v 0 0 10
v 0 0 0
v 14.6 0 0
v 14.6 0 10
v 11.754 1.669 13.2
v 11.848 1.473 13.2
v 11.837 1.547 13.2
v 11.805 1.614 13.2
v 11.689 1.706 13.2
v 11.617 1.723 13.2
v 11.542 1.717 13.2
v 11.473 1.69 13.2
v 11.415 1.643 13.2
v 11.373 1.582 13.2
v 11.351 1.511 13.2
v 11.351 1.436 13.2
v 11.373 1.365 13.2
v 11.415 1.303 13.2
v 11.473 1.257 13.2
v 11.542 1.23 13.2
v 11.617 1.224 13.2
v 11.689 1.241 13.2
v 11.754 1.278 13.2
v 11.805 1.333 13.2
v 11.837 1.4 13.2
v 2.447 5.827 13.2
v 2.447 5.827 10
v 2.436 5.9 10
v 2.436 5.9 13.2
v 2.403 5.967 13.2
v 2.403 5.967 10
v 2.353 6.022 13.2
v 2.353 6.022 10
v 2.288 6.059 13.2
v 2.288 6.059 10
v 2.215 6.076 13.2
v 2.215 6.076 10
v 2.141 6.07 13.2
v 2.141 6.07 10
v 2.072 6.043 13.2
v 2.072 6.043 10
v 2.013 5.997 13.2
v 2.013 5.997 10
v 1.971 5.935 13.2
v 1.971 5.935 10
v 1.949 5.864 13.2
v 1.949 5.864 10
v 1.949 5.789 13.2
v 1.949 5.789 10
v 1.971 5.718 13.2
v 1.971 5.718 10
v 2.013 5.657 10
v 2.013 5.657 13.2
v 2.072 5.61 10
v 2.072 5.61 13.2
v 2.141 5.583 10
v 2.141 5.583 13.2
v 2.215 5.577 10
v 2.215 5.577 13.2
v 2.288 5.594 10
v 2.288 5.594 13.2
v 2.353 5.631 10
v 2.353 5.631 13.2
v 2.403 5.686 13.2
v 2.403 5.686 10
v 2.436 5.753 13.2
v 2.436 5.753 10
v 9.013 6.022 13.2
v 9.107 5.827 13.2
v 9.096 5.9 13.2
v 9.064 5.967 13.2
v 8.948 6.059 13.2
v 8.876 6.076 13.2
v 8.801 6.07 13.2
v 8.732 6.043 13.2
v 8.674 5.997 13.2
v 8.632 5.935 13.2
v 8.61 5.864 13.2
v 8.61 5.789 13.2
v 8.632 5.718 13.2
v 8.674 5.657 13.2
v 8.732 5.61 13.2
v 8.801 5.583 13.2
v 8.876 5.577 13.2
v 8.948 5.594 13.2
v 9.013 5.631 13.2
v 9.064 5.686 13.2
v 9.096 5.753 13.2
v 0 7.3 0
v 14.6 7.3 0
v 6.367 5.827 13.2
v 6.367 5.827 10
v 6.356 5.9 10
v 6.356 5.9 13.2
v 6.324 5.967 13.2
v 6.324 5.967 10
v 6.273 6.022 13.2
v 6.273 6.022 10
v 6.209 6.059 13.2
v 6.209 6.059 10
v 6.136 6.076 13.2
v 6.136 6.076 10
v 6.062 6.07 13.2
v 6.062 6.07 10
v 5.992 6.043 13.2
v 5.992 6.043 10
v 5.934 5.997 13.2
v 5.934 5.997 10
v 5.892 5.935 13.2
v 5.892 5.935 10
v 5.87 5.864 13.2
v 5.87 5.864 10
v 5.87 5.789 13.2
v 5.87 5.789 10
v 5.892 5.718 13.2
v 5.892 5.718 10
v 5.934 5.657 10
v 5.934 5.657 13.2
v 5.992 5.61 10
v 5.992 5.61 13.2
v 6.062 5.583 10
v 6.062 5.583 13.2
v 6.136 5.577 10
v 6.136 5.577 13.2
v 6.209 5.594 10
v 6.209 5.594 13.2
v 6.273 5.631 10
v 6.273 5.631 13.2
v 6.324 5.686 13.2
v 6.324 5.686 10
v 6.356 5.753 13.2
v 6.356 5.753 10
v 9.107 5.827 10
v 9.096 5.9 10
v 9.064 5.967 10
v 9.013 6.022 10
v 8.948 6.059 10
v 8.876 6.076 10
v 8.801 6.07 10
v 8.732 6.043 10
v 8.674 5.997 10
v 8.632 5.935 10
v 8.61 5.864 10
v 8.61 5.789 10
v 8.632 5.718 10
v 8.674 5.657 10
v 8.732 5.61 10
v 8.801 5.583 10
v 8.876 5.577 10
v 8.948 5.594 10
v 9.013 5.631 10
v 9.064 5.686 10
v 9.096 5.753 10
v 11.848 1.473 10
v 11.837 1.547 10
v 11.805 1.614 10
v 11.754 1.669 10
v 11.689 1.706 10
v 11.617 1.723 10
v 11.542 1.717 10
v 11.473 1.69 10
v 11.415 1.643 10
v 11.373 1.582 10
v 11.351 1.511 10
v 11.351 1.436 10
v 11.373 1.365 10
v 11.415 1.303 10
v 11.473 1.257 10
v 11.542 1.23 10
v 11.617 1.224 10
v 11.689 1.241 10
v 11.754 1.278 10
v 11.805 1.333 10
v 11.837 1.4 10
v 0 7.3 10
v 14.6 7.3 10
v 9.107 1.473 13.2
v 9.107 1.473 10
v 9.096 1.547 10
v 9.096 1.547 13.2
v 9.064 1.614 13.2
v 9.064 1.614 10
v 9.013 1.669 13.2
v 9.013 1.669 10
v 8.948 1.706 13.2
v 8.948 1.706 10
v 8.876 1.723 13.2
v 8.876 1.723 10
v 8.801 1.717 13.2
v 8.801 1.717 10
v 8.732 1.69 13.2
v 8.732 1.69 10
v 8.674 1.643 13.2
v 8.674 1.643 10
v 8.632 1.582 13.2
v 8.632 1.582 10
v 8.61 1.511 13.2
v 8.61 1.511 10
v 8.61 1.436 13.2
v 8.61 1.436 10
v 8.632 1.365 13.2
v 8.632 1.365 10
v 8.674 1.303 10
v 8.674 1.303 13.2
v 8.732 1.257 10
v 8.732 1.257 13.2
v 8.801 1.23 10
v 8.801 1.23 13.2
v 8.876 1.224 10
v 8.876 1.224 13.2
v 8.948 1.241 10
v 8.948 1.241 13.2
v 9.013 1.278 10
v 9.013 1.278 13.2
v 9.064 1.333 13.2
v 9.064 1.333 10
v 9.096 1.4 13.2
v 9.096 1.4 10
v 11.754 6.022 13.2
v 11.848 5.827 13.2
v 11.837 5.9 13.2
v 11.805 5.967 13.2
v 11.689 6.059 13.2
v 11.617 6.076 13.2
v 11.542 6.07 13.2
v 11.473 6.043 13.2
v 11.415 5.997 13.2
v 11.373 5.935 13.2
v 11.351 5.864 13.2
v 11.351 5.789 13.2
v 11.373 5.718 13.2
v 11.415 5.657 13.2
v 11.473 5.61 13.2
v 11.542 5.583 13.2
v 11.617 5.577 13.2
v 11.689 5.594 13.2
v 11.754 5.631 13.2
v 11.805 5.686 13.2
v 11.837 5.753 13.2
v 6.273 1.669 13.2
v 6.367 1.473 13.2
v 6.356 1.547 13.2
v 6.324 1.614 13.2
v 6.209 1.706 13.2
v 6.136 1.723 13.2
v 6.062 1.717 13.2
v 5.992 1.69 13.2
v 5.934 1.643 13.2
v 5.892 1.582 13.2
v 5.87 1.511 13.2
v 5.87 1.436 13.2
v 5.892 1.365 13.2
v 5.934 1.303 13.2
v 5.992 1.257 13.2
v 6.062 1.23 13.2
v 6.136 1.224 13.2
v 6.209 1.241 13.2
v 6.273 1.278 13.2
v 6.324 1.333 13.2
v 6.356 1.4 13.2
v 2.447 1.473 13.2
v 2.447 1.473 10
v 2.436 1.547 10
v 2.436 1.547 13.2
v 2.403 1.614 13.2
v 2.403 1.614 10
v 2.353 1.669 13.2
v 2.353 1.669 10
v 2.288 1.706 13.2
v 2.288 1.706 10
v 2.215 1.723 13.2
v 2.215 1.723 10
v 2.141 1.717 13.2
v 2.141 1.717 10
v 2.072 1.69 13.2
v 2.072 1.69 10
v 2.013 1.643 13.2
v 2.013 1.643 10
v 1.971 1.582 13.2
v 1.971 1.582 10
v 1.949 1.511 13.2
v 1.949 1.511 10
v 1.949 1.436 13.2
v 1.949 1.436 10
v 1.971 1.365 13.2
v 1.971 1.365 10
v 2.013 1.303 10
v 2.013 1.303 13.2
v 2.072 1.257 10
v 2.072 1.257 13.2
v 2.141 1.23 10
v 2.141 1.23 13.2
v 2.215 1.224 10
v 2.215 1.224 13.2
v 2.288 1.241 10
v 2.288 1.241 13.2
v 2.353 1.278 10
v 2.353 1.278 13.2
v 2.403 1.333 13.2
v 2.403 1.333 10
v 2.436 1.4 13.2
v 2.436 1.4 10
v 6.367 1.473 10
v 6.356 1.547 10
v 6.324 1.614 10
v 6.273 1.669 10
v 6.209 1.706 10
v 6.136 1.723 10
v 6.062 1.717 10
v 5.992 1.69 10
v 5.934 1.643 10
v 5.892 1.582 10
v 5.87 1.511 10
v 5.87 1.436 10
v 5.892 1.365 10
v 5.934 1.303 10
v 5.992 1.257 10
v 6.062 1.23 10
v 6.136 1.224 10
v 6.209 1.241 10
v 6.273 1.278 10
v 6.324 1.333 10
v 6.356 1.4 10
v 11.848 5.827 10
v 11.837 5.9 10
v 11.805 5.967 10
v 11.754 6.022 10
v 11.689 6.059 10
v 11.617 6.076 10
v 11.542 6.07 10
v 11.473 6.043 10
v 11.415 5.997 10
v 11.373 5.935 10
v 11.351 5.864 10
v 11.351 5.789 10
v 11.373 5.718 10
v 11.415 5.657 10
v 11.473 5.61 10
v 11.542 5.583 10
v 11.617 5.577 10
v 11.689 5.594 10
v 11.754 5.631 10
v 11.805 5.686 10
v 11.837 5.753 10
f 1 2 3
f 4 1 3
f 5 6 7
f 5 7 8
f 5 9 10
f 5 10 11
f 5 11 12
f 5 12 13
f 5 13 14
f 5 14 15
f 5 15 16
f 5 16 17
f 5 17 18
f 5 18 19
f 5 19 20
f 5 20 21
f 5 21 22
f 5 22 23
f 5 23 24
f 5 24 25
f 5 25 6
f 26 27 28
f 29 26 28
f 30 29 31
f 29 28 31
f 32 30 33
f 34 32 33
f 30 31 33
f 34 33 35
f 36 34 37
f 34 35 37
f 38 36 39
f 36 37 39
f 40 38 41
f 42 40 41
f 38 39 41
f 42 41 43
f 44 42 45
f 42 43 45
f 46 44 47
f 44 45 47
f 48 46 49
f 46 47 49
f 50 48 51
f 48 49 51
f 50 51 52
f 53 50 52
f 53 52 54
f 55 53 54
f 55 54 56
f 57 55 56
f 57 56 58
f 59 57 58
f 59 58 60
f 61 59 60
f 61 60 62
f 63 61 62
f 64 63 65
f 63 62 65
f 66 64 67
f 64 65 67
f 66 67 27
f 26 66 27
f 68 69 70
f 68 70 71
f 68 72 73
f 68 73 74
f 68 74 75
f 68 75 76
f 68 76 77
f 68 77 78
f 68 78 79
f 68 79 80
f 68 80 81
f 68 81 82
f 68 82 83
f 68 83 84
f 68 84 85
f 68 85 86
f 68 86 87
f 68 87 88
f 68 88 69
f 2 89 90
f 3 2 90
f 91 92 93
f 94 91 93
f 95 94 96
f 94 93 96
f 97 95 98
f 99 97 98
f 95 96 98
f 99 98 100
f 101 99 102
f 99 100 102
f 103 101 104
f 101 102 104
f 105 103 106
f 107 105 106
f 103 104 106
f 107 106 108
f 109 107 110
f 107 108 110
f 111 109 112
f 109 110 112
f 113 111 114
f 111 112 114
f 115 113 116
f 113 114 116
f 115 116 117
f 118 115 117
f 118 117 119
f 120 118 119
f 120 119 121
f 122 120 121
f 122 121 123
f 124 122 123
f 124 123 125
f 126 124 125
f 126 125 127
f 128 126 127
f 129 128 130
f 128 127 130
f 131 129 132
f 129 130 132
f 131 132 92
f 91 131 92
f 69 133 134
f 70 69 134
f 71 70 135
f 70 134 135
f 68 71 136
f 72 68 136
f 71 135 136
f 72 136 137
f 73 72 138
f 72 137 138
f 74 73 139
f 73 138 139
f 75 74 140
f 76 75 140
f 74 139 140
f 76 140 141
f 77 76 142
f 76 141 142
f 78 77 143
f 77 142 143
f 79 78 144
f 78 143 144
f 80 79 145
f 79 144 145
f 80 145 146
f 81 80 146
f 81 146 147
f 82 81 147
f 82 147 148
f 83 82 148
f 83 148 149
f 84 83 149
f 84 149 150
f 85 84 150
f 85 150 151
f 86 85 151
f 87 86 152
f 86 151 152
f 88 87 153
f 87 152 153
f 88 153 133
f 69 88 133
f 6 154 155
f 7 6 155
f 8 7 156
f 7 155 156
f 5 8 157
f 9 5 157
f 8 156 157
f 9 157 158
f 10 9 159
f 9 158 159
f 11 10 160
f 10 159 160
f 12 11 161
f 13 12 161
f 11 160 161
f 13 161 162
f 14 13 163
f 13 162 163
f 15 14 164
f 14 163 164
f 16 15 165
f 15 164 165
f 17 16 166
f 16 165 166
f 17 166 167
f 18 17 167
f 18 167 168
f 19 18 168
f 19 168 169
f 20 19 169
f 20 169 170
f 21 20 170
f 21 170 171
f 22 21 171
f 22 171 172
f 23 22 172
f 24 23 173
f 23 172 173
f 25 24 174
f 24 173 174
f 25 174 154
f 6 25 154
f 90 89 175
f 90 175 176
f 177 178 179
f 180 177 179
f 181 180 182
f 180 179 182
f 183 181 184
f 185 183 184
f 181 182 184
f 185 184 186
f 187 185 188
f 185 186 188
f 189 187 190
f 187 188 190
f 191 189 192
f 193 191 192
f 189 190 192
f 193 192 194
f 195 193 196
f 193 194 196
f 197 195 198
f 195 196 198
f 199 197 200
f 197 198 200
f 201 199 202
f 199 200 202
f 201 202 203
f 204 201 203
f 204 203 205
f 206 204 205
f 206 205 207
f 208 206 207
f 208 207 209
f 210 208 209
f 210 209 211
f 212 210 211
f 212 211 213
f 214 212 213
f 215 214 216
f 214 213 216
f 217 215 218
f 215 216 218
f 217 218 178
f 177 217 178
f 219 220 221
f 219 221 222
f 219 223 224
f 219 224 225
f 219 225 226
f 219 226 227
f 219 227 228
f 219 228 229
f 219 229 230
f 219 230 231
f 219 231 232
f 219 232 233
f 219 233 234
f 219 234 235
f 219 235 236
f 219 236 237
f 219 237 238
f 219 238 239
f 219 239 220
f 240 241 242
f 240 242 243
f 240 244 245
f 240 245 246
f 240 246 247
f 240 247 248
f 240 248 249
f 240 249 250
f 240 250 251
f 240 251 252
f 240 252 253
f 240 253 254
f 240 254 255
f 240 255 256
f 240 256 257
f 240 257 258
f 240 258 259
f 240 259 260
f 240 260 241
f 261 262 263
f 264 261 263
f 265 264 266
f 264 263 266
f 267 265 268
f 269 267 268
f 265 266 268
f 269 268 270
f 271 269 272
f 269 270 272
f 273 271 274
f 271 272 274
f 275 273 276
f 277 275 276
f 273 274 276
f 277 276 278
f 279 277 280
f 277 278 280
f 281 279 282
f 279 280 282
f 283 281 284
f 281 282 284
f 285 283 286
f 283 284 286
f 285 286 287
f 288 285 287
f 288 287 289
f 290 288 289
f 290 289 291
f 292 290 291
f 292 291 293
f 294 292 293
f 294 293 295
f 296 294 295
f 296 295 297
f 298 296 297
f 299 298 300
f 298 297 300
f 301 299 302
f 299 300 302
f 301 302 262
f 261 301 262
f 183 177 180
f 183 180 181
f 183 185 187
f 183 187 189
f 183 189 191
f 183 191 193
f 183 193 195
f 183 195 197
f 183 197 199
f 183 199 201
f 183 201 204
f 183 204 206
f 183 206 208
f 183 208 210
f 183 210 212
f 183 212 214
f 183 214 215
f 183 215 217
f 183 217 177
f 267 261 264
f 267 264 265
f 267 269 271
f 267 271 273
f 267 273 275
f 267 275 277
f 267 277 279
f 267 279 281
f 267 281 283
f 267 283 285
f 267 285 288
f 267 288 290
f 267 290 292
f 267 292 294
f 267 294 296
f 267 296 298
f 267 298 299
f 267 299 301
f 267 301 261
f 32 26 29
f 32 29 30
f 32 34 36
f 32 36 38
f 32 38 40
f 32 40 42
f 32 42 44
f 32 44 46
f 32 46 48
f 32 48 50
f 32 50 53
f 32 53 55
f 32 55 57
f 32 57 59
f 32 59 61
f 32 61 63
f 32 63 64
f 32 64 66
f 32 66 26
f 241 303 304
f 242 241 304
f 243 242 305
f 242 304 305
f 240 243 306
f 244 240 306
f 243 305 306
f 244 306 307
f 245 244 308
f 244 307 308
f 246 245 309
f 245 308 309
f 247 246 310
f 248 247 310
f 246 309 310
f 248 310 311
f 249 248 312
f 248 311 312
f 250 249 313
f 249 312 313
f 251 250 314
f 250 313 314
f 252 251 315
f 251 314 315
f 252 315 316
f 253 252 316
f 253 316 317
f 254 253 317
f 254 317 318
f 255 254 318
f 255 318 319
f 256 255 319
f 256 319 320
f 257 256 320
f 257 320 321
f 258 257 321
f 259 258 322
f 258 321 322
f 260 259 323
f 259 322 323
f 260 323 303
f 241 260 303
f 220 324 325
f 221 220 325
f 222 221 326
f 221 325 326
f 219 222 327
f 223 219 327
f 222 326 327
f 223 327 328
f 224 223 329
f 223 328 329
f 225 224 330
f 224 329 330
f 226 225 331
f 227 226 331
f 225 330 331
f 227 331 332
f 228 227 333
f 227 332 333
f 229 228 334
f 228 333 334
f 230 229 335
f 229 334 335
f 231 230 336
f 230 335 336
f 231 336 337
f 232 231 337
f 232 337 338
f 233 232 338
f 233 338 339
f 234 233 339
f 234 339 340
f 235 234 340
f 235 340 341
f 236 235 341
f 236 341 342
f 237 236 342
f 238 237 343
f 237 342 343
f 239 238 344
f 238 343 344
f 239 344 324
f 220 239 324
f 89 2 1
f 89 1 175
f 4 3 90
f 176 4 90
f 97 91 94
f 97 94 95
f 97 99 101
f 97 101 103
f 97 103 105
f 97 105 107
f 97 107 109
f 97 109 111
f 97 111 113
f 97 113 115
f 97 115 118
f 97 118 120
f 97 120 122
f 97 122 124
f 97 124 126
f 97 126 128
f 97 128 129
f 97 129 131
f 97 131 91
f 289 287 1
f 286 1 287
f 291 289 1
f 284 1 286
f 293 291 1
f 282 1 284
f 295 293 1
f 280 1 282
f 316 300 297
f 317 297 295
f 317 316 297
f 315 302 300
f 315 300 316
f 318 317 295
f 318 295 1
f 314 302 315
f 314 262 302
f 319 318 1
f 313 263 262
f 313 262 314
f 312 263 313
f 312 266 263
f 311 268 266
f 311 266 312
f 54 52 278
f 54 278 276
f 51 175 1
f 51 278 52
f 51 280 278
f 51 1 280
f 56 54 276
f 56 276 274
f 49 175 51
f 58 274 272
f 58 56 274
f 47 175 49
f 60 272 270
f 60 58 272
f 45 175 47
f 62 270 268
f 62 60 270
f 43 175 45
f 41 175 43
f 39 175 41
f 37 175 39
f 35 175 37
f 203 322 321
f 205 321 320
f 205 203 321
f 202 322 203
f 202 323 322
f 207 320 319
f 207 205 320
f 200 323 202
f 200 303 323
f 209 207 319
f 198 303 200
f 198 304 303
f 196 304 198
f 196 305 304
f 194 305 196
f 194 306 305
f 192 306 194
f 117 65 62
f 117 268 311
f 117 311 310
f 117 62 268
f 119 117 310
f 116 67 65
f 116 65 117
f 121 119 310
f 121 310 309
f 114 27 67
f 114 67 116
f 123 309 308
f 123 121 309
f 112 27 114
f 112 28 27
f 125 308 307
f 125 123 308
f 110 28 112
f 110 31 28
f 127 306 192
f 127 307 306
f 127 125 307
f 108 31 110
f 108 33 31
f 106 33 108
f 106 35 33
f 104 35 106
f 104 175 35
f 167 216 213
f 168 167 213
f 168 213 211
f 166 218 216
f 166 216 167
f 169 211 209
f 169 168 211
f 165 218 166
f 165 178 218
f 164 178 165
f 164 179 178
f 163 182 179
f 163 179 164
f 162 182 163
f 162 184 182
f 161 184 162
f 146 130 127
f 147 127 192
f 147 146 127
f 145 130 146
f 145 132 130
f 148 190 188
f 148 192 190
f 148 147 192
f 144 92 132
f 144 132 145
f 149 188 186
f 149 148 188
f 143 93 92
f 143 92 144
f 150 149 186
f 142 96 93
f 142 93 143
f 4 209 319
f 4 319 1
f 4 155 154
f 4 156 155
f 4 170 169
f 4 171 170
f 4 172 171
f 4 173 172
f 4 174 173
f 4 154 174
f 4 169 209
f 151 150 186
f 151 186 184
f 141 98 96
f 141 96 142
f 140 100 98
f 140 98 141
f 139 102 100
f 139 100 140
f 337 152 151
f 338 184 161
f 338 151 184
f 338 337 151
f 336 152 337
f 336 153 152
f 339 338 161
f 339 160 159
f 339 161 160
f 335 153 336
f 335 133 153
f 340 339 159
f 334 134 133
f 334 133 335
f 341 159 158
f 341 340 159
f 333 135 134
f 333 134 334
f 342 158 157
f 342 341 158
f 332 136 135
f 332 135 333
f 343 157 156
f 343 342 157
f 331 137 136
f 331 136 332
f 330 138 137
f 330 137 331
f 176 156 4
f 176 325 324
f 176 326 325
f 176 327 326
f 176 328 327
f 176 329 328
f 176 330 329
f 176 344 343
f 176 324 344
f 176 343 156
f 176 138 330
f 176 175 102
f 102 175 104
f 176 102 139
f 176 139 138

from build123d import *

# Parameters (mm, degrees)
F0_W     = 14.6
F0_H     = 7.3
F1_DEPTH = 10
F2_R     = 0.25
F3_DEPTH = 3.2


with BuildPart() as f1:
    # F0 (on Top) → F1 (new body)
    with BuildSketch(Plane.XY):
        with Locations((7.3, 3.65)):
            Rectangle(F0_W, F0_H)
    extrude(amount=F1_DEPTH)

    # F2 (on face) → F3 (join)
    with BuildSketch(Plane.XY.offset(10)):
        with Locations((2.196679, 5.826643)):
            Circle(F2_R)
        with Locations((2.196679, 1.473357)):
            Circle(F2_R)
        with Locations((6.117353, 1.473357)):
            Circle(F2_R)
        with Locations((6.117353, 5.826643)):
            Circle(F2_R)
        with Locations((8.857069, 5.826643)):
            Circle(F2_R)
        with Locations((11.597946, 5.826643)):
            Circle(F2_R)
        with Locations((11.597946, 1.473357)):
            Circle(F2_R)
        with Locations((8.857069, 1.473357)):
            Circle(F2_R)
    extrude(amount=F3_DEPTH)


solid = f1.part
